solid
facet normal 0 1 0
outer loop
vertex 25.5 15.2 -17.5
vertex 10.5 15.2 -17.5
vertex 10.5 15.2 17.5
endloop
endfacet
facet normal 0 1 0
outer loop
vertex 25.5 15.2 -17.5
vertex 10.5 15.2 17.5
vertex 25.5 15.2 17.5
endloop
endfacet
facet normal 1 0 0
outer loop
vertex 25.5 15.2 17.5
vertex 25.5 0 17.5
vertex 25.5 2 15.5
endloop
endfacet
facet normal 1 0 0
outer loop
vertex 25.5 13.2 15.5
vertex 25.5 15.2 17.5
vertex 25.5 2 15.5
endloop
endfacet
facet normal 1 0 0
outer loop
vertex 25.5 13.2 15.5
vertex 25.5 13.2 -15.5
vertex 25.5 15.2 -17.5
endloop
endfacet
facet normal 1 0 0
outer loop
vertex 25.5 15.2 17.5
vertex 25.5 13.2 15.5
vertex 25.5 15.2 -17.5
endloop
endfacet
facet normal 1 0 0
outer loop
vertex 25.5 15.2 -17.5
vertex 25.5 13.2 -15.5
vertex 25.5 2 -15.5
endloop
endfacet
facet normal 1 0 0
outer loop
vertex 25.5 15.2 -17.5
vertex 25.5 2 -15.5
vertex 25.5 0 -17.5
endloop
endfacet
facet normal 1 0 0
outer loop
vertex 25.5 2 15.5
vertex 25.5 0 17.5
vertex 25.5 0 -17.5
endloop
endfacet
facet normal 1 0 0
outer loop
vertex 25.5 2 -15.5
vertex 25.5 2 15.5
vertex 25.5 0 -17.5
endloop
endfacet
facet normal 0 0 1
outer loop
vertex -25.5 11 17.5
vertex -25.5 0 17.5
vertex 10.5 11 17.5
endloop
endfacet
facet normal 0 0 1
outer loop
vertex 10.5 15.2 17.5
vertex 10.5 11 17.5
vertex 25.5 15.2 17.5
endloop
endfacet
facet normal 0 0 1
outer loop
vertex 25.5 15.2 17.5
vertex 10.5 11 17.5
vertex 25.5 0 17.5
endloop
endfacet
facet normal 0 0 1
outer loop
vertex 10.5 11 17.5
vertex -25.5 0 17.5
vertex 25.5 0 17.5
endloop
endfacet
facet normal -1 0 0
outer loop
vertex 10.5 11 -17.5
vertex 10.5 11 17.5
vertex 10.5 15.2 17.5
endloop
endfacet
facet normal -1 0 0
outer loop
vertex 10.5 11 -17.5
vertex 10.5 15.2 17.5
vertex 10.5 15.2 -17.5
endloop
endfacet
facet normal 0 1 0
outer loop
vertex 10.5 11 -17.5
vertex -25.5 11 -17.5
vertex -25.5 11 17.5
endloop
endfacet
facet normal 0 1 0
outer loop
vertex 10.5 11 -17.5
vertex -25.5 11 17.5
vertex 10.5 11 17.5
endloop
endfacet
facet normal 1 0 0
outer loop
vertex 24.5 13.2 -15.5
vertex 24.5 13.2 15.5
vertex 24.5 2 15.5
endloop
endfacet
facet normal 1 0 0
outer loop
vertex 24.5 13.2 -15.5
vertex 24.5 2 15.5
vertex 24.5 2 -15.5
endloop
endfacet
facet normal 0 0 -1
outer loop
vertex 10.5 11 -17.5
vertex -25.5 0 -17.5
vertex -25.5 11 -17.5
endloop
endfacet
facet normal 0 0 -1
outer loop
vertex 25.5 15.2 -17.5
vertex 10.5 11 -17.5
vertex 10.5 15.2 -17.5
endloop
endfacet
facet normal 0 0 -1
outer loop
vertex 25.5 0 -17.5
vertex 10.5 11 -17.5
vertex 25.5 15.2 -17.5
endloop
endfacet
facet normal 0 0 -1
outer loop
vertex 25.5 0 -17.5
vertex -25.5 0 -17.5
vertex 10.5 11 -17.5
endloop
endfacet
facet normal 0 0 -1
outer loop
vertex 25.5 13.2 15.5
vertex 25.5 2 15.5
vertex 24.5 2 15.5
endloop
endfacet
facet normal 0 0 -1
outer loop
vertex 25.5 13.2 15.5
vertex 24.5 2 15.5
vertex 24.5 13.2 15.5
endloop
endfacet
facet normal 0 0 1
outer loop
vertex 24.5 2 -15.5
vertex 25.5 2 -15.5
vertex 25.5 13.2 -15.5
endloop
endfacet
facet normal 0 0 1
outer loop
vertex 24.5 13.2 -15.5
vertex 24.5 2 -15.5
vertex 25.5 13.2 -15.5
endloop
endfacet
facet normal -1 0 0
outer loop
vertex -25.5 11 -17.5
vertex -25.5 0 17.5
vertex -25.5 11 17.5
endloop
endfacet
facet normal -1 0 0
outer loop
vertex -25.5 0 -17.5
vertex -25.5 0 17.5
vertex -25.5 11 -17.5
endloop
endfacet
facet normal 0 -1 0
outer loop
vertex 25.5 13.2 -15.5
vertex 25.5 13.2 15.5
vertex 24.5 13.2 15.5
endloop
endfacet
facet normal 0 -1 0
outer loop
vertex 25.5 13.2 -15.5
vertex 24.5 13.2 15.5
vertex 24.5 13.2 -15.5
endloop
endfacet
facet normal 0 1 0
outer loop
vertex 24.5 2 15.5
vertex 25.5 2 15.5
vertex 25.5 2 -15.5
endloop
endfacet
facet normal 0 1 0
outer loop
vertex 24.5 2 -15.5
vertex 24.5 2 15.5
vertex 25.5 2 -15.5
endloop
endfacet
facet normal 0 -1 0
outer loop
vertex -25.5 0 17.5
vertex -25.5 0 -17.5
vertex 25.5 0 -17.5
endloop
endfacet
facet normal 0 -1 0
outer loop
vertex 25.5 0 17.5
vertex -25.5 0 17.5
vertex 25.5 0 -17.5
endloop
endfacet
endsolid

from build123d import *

# Parameters (mm, degrees)
SKETCH1_W           = 36
SKETCH1_H           = 35
BOSS_EXTRUDE1_DEPTH = 11
SKETCH1_3_W         = 15
SKETCH1_3_H         = 35
BOSS_EXTRUDE2_DEPTH = 15.2
SKETCH2_W           = 31
SKETCH2_H           = 11.2
CUT_EXTRUDE1_DEPTH  = 1


with BuildPart() as part:
    # Sketch1 → Boss-Extrude1 (new body)
    with BuildSketch(Plane(origin=(0, 0, 0), x_dir=(1, 0, 0), z_dir=(0, 1, 0))):
        with Locations((-7.5, 0)):
            Rectangle(SKETCH1_W, SKETCH1_H)
    extrude(amount=BOSS_EXTRUDE1_DEPTH)

    # Sketch1<3> → Boss-Extrude2 (add)
    with BuildSketch(Plane(origin=(0, 0, 0), x_dir=(1, 0, 0), z_dir=(0, 1, 0))):
        with Locations((18, 0)):
            Rectangle(SKETCH1_3_W, SKETCH1_3_H)
    extrude(amount=BOSS_EXTRUDE2_DEPTH)

    # Sketch2 → Cut-Extrude1 (cut)
    with BuildSketch(Plane(origin=(25.5, 0, 0), x_dir=(0, 0, -1), z_dir=(1, 0, 0))):
        with Locations((0, 7.6)):
            Rectangle(SKETCH2_W, SKETCH2_H)
    extrude(amount=-CUT_EXTRUDE1_DEPTH, mode=Mode.SUBTRACT)


solid = part.part
